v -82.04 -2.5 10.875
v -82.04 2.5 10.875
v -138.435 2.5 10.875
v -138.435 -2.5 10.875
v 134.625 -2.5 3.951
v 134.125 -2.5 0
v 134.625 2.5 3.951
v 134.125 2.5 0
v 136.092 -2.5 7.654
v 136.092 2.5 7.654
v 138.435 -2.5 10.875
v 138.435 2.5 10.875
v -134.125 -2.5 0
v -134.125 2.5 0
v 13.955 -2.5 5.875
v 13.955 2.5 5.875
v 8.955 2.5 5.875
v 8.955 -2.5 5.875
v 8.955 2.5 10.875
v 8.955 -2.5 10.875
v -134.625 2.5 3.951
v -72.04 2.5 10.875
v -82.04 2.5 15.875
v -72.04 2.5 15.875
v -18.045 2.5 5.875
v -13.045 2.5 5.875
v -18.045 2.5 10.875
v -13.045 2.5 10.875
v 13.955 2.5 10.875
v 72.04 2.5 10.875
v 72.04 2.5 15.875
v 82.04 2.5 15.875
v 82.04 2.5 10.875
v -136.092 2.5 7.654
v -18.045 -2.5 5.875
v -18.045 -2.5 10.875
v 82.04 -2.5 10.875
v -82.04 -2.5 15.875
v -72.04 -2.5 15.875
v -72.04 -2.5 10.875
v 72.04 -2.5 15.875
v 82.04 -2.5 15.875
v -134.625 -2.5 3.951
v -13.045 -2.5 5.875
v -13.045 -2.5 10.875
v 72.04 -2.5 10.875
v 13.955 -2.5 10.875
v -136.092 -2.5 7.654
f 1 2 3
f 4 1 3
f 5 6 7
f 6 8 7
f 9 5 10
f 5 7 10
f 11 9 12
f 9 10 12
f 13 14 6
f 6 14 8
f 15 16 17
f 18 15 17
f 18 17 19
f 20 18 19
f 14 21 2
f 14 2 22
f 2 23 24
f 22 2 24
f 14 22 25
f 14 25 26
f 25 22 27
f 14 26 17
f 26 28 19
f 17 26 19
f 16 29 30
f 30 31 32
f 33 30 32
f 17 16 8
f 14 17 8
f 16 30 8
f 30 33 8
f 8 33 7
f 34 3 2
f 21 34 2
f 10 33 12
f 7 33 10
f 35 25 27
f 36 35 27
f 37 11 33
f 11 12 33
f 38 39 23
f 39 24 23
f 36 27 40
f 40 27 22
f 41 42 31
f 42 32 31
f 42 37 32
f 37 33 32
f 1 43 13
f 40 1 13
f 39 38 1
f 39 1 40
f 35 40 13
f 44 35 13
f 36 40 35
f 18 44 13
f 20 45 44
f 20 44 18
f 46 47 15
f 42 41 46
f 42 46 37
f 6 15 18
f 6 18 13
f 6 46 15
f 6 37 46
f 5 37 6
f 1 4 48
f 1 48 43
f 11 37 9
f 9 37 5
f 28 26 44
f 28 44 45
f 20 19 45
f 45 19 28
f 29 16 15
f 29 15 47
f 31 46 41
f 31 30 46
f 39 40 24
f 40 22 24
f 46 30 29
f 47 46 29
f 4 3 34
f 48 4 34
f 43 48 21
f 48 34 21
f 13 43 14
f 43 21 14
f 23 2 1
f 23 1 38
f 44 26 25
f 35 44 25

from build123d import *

# Parameters (mm, degrees)
SKETCH1_W           = 10
SKETCH1_H           = 5
BOSS_EXTRUDE1_DEPTH = 2.5
CUT_EXTRUDE2_REACH  = 141.432
SKETCH2_W           = 5
SKETCH2_H           = 5


with BuildPart() as part:
    # Sketch1 → Boss-Extrude1 (new, symmetric)
    with BuildSketch(Plane(origin=(0, 0, 0), x_dir=(-1, 0, 0), z_dir=(0, 1, 0))):
        with BuildLine():
            ThreePointArc((138.434966494, 10.875), (135.24177294, 5.848962219), (134.125, 0))
            Line((134.125, 0), (-134.125, 0))
            ThreePointArc((-134.125, 0), (-135.24177294, 5.848962219), (-138.434966494, 10.875))
            Line((-138.434966494, 10.875), (138.434966494, 10.875))
        make_face()
        with Locations((-77.04, 13.375)):
            Rectangle(SKETCH1_W, SKETCH1_H)
        with Locations((77.04, 13.375)):
            Rectangle(SKETCH1_W, SKETCH1_H)
    extrude(amount=BOSS_EXTRUDE1_DEPTH, both=True)

    # Sketch2 → Cut-Extrude2 (cut, up to next)
    with BuildSketch(Plane(origin=(0, 2.5, 0), x_dir=(-1, 0, 0), z_dir=(0, 1, 0)), mode=Mode.PRIVATE) as cut_extrude2_sk1:
        with Locations((-11.455033506, 8.375)):
            Rectangle(SKETCH2_W, SKETCH2_H)
    cut_extrude2_tool1 = extrude(cut_extrude2_sk1.sketch, amount=-CUT_EXTRUDE2_REACH, mode=Mode.PRIVATE) & part.part
    # Sketch2 → Cut-Extrude2 (cut, up to next)
    with BuildSketch(Plane(origin=(0, 2.5, 0), x_dir=(-1, 0, 0), z_dir=(0, 1, 0)), mode=Mode.PRIVATE) as cut_extrude2_sk2:
        with Locations((15.544966494, 8.375)):
            Rectangle(SKETCH2_W, SKETCH2_H)
    cut_extrude2_tool2 = extrude(cut_extrude2_sk2.sketch, amount=-CUT_EXTRUDE2_REACH, mode=Mode.PRIVATE) & part.part
    add(cut_extrude2_tool1.solids().sort_by_distance((11.455034, 2.5, 8.375))[0], mode=Mode.SUBTRACT)
    add(cut_extrude2_tool2.solids().sort_by_distance((-15.544966, 2.5, 8.375))[0], mode=Mode.SUBTRACT)


solid = part.part
